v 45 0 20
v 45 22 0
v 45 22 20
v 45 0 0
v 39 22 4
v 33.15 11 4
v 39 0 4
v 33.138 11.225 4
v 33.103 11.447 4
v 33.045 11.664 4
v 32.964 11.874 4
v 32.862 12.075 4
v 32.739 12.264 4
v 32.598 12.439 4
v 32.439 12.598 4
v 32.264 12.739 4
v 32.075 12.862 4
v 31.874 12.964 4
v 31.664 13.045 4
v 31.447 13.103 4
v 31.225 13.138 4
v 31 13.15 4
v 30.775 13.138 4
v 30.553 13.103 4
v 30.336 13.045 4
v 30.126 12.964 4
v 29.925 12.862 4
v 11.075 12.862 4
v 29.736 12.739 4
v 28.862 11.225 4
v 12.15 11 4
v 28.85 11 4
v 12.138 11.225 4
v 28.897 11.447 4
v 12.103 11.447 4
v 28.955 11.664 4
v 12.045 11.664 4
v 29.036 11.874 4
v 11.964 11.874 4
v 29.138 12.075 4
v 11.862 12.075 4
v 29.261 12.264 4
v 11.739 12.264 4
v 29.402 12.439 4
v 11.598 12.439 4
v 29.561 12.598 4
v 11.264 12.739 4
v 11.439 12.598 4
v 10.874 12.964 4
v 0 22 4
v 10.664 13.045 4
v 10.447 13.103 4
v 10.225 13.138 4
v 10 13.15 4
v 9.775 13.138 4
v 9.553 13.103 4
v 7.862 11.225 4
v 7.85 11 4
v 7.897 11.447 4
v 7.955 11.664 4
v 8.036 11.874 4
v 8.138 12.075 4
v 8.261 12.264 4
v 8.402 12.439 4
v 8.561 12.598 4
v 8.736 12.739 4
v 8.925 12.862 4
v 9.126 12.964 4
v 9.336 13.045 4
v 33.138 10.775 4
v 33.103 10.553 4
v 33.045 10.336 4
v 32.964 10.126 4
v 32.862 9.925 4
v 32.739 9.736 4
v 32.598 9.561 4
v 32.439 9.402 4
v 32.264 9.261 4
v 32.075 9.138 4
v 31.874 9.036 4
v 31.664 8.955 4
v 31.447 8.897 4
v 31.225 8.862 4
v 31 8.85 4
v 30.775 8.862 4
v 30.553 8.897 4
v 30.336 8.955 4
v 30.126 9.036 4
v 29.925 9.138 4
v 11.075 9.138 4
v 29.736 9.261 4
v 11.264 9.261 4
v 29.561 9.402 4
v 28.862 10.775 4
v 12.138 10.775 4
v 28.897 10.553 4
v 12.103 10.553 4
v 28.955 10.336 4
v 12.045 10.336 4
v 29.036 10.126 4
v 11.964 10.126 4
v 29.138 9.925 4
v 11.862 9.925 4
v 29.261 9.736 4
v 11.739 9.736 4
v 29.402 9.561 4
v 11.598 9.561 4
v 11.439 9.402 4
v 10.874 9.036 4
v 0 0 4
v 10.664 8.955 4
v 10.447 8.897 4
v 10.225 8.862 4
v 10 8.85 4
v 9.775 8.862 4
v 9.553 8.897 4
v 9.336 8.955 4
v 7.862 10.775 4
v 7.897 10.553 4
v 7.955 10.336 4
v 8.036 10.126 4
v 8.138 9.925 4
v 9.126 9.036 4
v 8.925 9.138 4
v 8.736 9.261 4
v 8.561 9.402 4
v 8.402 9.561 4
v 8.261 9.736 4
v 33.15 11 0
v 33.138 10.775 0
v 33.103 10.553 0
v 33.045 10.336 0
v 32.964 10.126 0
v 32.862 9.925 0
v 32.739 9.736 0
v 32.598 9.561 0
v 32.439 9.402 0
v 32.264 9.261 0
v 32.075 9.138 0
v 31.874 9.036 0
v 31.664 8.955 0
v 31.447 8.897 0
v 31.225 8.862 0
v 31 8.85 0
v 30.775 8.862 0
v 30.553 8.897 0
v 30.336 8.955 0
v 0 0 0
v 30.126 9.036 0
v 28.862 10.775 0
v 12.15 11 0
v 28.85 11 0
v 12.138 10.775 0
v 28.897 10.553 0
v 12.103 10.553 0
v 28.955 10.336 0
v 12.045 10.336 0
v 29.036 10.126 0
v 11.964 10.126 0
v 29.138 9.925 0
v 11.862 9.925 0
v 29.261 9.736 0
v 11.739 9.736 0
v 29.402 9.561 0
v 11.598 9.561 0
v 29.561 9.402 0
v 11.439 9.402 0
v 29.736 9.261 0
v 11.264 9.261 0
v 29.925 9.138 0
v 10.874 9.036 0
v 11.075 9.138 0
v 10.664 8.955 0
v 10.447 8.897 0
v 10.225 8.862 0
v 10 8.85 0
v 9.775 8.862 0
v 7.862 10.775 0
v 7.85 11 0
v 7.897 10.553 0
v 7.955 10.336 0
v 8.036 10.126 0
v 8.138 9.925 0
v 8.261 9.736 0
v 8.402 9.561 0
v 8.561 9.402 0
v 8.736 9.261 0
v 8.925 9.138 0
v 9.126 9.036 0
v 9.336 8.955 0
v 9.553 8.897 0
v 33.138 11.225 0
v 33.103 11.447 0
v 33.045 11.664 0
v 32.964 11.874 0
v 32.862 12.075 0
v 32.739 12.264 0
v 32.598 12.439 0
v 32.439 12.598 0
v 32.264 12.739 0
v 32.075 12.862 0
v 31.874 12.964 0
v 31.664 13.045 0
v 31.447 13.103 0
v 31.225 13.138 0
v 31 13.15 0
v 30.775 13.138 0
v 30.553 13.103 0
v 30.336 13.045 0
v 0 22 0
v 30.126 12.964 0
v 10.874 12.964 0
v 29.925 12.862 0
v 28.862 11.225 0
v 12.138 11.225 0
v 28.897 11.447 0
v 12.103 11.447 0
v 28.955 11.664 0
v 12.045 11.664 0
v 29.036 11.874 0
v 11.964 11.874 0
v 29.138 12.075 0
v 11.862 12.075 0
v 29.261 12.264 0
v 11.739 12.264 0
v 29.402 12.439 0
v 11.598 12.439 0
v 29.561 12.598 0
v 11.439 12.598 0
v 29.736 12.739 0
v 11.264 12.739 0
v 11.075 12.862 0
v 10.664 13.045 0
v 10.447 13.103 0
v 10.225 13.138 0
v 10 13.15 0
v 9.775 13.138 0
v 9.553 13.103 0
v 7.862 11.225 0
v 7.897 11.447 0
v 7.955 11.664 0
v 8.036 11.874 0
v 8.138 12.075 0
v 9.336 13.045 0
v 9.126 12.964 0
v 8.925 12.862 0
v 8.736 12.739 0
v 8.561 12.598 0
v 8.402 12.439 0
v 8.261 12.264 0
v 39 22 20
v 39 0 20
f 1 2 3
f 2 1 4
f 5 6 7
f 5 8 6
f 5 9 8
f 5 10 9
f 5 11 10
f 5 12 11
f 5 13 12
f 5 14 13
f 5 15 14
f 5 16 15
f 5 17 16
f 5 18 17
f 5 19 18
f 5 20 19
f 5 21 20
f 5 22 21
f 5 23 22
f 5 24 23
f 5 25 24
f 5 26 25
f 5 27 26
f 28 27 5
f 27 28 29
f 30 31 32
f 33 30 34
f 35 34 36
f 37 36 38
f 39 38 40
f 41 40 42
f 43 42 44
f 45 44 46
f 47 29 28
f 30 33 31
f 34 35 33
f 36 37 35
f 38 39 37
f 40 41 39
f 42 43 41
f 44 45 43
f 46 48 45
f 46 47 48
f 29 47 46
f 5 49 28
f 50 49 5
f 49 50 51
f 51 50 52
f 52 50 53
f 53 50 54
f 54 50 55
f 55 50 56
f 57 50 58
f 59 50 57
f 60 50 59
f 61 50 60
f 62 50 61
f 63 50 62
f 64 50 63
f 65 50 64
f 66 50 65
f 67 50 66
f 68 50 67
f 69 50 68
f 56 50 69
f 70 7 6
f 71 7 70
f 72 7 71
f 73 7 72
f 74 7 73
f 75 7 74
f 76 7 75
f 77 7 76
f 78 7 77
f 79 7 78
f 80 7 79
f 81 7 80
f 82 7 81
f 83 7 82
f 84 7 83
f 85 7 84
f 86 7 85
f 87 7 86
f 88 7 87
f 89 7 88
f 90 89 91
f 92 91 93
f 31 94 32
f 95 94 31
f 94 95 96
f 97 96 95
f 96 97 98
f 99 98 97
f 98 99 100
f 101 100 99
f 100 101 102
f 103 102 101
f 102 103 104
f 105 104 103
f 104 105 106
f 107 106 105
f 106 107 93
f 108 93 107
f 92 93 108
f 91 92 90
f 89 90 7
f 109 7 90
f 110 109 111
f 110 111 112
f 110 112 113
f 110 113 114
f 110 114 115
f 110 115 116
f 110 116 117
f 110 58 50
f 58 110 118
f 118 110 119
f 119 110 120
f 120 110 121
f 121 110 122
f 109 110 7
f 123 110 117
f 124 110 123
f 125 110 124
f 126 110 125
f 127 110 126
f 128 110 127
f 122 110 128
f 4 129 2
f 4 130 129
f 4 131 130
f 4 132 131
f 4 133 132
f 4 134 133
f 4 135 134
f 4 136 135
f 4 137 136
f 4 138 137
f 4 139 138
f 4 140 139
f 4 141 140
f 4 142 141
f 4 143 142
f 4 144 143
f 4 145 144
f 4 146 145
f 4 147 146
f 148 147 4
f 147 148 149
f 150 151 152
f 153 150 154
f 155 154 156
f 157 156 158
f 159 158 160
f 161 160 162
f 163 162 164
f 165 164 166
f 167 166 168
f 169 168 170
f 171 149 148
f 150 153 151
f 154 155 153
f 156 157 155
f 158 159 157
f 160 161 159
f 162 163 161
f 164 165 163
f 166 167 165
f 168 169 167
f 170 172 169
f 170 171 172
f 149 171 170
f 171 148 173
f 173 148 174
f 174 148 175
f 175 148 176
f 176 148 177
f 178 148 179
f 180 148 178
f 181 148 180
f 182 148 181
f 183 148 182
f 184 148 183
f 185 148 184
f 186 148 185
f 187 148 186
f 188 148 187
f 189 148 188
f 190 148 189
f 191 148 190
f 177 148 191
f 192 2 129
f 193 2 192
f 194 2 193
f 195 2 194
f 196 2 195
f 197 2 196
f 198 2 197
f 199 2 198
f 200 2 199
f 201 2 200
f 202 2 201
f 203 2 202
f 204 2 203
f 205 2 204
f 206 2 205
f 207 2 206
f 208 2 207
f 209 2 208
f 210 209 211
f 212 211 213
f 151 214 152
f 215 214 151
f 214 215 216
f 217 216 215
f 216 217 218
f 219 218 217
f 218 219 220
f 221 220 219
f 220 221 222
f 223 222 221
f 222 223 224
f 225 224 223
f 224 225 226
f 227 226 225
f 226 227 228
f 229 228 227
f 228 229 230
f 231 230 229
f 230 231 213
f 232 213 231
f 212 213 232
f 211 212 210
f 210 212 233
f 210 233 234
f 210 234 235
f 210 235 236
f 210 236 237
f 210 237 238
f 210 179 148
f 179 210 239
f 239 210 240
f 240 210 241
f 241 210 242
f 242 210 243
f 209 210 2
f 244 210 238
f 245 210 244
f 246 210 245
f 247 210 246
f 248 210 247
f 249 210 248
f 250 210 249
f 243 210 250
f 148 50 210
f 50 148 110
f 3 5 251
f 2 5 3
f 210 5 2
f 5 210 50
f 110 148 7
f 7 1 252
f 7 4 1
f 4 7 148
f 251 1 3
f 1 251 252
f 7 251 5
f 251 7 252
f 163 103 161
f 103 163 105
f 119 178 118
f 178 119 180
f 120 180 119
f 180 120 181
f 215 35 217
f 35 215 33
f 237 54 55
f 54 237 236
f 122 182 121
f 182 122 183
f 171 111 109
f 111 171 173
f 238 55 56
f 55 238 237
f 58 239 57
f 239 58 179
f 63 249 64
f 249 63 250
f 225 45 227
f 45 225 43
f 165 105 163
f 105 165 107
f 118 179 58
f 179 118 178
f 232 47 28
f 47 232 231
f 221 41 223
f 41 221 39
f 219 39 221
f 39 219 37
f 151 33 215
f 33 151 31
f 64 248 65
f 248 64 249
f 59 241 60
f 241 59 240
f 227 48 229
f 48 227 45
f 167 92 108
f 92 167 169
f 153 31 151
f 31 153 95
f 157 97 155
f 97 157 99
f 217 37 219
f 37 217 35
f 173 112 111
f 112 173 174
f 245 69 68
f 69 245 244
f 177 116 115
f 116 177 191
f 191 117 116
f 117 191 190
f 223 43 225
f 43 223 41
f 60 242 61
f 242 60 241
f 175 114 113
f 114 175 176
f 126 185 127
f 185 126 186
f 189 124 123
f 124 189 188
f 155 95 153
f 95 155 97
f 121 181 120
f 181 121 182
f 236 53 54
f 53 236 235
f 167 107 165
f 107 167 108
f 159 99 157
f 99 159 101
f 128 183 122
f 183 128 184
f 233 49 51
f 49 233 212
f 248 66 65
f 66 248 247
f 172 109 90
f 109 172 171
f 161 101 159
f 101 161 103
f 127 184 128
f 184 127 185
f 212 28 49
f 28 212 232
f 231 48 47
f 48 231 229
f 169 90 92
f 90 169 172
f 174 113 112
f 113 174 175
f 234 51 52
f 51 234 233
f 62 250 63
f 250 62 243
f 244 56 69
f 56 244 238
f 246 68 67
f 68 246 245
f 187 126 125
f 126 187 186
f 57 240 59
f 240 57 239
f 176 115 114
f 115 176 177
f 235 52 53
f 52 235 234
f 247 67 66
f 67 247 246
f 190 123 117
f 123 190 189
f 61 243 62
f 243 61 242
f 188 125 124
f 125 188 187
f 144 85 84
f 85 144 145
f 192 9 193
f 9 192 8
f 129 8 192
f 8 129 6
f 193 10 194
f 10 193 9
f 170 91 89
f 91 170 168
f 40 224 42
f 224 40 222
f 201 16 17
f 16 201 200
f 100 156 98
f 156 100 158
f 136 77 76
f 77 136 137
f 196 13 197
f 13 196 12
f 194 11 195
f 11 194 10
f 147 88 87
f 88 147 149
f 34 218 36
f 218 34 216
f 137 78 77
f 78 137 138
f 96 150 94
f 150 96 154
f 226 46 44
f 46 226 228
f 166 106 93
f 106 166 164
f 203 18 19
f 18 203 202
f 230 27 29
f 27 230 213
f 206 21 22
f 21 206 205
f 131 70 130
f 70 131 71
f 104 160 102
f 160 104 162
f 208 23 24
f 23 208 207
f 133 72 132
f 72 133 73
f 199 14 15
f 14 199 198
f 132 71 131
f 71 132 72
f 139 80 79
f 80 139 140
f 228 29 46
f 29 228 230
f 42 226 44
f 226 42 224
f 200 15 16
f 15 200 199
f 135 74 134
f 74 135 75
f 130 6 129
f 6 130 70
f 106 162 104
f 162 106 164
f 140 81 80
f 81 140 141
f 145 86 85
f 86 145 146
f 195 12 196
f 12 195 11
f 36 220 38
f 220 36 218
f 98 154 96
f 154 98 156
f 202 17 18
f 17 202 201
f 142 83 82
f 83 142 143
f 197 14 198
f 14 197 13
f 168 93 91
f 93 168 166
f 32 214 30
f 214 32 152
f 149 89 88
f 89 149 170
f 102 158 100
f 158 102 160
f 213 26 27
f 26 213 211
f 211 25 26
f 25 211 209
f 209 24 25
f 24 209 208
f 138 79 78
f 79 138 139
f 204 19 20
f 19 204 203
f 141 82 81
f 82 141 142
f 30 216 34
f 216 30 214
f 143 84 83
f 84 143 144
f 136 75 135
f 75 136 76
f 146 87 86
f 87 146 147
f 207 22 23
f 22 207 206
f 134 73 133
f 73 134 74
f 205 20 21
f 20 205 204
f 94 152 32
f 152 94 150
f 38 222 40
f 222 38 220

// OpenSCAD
// Latch catch plate.
$fn = 60;
eps = 0.02;
length = 45;
height = 16;
width = 22;
thickness = 4;
difference() {
    union() { cube([length,width,thickness]); translate([length-6,0,thickness]) cube([6,width,height]); }
    for(x=[10,length-14]) translate([x,width/2,-eps]) cylinder(d=4.3,h=thickness+2*eps);
}
